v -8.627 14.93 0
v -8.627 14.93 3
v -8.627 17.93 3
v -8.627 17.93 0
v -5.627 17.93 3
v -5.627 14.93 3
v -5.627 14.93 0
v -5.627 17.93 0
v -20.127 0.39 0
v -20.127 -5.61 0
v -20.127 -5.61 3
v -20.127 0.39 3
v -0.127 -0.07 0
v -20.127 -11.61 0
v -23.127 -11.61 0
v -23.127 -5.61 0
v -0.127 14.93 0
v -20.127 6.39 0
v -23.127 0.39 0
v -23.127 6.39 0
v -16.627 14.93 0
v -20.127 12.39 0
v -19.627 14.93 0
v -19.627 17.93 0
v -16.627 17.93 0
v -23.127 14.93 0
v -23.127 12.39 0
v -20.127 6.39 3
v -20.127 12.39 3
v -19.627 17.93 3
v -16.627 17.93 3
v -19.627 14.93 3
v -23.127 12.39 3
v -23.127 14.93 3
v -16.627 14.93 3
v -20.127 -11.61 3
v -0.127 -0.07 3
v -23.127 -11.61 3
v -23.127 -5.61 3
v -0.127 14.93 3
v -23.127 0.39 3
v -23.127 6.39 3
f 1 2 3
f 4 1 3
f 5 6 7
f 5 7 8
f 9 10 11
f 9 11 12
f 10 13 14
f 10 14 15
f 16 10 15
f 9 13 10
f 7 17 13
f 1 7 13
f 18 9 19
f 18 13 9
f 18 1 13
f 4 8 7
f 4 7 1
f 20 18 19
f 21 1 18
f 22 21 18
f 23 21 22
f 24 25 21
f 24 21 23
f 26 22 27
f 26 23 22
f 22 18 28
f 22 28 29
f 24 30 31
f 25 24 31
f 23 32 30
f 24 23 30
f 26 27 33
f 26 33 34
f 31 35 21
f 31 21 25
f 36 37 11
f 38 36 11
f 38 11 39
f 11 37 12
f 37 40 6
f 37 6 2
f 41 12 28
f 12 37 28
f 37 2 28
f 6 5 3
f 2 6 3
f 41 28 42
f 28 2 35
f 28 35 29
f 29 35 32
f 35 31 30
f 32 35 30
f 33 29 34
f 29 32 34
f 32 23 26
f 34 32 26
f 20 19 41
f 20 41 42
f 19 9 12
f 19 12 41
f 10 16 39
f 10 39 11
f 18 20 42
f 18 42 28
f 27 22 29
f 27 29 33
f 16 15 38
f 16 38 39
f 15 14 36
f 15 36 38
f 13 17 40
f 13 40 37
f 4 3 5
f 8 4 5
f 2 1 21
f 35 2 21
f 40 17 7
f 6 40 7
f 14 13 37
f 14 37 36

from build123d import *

# Parameters (mm, degrees)
BOSS_EXTRUDE1_DEPTH = 3
SKETCH2_W           = 3
SKETCH2_H           = 3
BOSS_EXTRUDE2_DEPTH = 3


with BuildPart() as part:
    # Sketch1 → Boss-Extrude1 (new body)
    with BuildSketch(Plane.XY):
        Polygon((-0.126642445, 14.929558907), (-0.126642445, -0.070441093), (-20.126642445, -11.610441093), (-23.126642445, -11.610441093), (-23.126642445, -5.610441093), (-20.126642445, -5.610441093), (-20.126642445, 0.389558907), (-23.126642445, 0.389558907), (-23.126642445, 6.389558907), (-20.126642445, 6.389558907), (-20.126642445, 12.389558907), (-23.126642445, 12.389558907), (-23.126642445, 14.929558907), (-14.126642445, 14.929558907), (-11.126642445, 14.929558907), (-3.126642445, 14.929558907), align=None)
    extrude(amount=BOSS_EXTRUDE1_DEPTH)

    # Sketch2 → Boss-Extrude2 (add)
    with BuildSketch(Plane.XY.offset(3)):
        with Locations((-7.126642445, 16.429558907)):
            Rectangle(SKETCH2_W, SKETCH2_H)
        with Locations((-18.126642445, 16.429558907)):
            Rectangle(SKETCH2_W, SKETCH2_H)
    extrude(amount=-BOSS_EXTRUDE2_DEPTH)


solid = part.part
